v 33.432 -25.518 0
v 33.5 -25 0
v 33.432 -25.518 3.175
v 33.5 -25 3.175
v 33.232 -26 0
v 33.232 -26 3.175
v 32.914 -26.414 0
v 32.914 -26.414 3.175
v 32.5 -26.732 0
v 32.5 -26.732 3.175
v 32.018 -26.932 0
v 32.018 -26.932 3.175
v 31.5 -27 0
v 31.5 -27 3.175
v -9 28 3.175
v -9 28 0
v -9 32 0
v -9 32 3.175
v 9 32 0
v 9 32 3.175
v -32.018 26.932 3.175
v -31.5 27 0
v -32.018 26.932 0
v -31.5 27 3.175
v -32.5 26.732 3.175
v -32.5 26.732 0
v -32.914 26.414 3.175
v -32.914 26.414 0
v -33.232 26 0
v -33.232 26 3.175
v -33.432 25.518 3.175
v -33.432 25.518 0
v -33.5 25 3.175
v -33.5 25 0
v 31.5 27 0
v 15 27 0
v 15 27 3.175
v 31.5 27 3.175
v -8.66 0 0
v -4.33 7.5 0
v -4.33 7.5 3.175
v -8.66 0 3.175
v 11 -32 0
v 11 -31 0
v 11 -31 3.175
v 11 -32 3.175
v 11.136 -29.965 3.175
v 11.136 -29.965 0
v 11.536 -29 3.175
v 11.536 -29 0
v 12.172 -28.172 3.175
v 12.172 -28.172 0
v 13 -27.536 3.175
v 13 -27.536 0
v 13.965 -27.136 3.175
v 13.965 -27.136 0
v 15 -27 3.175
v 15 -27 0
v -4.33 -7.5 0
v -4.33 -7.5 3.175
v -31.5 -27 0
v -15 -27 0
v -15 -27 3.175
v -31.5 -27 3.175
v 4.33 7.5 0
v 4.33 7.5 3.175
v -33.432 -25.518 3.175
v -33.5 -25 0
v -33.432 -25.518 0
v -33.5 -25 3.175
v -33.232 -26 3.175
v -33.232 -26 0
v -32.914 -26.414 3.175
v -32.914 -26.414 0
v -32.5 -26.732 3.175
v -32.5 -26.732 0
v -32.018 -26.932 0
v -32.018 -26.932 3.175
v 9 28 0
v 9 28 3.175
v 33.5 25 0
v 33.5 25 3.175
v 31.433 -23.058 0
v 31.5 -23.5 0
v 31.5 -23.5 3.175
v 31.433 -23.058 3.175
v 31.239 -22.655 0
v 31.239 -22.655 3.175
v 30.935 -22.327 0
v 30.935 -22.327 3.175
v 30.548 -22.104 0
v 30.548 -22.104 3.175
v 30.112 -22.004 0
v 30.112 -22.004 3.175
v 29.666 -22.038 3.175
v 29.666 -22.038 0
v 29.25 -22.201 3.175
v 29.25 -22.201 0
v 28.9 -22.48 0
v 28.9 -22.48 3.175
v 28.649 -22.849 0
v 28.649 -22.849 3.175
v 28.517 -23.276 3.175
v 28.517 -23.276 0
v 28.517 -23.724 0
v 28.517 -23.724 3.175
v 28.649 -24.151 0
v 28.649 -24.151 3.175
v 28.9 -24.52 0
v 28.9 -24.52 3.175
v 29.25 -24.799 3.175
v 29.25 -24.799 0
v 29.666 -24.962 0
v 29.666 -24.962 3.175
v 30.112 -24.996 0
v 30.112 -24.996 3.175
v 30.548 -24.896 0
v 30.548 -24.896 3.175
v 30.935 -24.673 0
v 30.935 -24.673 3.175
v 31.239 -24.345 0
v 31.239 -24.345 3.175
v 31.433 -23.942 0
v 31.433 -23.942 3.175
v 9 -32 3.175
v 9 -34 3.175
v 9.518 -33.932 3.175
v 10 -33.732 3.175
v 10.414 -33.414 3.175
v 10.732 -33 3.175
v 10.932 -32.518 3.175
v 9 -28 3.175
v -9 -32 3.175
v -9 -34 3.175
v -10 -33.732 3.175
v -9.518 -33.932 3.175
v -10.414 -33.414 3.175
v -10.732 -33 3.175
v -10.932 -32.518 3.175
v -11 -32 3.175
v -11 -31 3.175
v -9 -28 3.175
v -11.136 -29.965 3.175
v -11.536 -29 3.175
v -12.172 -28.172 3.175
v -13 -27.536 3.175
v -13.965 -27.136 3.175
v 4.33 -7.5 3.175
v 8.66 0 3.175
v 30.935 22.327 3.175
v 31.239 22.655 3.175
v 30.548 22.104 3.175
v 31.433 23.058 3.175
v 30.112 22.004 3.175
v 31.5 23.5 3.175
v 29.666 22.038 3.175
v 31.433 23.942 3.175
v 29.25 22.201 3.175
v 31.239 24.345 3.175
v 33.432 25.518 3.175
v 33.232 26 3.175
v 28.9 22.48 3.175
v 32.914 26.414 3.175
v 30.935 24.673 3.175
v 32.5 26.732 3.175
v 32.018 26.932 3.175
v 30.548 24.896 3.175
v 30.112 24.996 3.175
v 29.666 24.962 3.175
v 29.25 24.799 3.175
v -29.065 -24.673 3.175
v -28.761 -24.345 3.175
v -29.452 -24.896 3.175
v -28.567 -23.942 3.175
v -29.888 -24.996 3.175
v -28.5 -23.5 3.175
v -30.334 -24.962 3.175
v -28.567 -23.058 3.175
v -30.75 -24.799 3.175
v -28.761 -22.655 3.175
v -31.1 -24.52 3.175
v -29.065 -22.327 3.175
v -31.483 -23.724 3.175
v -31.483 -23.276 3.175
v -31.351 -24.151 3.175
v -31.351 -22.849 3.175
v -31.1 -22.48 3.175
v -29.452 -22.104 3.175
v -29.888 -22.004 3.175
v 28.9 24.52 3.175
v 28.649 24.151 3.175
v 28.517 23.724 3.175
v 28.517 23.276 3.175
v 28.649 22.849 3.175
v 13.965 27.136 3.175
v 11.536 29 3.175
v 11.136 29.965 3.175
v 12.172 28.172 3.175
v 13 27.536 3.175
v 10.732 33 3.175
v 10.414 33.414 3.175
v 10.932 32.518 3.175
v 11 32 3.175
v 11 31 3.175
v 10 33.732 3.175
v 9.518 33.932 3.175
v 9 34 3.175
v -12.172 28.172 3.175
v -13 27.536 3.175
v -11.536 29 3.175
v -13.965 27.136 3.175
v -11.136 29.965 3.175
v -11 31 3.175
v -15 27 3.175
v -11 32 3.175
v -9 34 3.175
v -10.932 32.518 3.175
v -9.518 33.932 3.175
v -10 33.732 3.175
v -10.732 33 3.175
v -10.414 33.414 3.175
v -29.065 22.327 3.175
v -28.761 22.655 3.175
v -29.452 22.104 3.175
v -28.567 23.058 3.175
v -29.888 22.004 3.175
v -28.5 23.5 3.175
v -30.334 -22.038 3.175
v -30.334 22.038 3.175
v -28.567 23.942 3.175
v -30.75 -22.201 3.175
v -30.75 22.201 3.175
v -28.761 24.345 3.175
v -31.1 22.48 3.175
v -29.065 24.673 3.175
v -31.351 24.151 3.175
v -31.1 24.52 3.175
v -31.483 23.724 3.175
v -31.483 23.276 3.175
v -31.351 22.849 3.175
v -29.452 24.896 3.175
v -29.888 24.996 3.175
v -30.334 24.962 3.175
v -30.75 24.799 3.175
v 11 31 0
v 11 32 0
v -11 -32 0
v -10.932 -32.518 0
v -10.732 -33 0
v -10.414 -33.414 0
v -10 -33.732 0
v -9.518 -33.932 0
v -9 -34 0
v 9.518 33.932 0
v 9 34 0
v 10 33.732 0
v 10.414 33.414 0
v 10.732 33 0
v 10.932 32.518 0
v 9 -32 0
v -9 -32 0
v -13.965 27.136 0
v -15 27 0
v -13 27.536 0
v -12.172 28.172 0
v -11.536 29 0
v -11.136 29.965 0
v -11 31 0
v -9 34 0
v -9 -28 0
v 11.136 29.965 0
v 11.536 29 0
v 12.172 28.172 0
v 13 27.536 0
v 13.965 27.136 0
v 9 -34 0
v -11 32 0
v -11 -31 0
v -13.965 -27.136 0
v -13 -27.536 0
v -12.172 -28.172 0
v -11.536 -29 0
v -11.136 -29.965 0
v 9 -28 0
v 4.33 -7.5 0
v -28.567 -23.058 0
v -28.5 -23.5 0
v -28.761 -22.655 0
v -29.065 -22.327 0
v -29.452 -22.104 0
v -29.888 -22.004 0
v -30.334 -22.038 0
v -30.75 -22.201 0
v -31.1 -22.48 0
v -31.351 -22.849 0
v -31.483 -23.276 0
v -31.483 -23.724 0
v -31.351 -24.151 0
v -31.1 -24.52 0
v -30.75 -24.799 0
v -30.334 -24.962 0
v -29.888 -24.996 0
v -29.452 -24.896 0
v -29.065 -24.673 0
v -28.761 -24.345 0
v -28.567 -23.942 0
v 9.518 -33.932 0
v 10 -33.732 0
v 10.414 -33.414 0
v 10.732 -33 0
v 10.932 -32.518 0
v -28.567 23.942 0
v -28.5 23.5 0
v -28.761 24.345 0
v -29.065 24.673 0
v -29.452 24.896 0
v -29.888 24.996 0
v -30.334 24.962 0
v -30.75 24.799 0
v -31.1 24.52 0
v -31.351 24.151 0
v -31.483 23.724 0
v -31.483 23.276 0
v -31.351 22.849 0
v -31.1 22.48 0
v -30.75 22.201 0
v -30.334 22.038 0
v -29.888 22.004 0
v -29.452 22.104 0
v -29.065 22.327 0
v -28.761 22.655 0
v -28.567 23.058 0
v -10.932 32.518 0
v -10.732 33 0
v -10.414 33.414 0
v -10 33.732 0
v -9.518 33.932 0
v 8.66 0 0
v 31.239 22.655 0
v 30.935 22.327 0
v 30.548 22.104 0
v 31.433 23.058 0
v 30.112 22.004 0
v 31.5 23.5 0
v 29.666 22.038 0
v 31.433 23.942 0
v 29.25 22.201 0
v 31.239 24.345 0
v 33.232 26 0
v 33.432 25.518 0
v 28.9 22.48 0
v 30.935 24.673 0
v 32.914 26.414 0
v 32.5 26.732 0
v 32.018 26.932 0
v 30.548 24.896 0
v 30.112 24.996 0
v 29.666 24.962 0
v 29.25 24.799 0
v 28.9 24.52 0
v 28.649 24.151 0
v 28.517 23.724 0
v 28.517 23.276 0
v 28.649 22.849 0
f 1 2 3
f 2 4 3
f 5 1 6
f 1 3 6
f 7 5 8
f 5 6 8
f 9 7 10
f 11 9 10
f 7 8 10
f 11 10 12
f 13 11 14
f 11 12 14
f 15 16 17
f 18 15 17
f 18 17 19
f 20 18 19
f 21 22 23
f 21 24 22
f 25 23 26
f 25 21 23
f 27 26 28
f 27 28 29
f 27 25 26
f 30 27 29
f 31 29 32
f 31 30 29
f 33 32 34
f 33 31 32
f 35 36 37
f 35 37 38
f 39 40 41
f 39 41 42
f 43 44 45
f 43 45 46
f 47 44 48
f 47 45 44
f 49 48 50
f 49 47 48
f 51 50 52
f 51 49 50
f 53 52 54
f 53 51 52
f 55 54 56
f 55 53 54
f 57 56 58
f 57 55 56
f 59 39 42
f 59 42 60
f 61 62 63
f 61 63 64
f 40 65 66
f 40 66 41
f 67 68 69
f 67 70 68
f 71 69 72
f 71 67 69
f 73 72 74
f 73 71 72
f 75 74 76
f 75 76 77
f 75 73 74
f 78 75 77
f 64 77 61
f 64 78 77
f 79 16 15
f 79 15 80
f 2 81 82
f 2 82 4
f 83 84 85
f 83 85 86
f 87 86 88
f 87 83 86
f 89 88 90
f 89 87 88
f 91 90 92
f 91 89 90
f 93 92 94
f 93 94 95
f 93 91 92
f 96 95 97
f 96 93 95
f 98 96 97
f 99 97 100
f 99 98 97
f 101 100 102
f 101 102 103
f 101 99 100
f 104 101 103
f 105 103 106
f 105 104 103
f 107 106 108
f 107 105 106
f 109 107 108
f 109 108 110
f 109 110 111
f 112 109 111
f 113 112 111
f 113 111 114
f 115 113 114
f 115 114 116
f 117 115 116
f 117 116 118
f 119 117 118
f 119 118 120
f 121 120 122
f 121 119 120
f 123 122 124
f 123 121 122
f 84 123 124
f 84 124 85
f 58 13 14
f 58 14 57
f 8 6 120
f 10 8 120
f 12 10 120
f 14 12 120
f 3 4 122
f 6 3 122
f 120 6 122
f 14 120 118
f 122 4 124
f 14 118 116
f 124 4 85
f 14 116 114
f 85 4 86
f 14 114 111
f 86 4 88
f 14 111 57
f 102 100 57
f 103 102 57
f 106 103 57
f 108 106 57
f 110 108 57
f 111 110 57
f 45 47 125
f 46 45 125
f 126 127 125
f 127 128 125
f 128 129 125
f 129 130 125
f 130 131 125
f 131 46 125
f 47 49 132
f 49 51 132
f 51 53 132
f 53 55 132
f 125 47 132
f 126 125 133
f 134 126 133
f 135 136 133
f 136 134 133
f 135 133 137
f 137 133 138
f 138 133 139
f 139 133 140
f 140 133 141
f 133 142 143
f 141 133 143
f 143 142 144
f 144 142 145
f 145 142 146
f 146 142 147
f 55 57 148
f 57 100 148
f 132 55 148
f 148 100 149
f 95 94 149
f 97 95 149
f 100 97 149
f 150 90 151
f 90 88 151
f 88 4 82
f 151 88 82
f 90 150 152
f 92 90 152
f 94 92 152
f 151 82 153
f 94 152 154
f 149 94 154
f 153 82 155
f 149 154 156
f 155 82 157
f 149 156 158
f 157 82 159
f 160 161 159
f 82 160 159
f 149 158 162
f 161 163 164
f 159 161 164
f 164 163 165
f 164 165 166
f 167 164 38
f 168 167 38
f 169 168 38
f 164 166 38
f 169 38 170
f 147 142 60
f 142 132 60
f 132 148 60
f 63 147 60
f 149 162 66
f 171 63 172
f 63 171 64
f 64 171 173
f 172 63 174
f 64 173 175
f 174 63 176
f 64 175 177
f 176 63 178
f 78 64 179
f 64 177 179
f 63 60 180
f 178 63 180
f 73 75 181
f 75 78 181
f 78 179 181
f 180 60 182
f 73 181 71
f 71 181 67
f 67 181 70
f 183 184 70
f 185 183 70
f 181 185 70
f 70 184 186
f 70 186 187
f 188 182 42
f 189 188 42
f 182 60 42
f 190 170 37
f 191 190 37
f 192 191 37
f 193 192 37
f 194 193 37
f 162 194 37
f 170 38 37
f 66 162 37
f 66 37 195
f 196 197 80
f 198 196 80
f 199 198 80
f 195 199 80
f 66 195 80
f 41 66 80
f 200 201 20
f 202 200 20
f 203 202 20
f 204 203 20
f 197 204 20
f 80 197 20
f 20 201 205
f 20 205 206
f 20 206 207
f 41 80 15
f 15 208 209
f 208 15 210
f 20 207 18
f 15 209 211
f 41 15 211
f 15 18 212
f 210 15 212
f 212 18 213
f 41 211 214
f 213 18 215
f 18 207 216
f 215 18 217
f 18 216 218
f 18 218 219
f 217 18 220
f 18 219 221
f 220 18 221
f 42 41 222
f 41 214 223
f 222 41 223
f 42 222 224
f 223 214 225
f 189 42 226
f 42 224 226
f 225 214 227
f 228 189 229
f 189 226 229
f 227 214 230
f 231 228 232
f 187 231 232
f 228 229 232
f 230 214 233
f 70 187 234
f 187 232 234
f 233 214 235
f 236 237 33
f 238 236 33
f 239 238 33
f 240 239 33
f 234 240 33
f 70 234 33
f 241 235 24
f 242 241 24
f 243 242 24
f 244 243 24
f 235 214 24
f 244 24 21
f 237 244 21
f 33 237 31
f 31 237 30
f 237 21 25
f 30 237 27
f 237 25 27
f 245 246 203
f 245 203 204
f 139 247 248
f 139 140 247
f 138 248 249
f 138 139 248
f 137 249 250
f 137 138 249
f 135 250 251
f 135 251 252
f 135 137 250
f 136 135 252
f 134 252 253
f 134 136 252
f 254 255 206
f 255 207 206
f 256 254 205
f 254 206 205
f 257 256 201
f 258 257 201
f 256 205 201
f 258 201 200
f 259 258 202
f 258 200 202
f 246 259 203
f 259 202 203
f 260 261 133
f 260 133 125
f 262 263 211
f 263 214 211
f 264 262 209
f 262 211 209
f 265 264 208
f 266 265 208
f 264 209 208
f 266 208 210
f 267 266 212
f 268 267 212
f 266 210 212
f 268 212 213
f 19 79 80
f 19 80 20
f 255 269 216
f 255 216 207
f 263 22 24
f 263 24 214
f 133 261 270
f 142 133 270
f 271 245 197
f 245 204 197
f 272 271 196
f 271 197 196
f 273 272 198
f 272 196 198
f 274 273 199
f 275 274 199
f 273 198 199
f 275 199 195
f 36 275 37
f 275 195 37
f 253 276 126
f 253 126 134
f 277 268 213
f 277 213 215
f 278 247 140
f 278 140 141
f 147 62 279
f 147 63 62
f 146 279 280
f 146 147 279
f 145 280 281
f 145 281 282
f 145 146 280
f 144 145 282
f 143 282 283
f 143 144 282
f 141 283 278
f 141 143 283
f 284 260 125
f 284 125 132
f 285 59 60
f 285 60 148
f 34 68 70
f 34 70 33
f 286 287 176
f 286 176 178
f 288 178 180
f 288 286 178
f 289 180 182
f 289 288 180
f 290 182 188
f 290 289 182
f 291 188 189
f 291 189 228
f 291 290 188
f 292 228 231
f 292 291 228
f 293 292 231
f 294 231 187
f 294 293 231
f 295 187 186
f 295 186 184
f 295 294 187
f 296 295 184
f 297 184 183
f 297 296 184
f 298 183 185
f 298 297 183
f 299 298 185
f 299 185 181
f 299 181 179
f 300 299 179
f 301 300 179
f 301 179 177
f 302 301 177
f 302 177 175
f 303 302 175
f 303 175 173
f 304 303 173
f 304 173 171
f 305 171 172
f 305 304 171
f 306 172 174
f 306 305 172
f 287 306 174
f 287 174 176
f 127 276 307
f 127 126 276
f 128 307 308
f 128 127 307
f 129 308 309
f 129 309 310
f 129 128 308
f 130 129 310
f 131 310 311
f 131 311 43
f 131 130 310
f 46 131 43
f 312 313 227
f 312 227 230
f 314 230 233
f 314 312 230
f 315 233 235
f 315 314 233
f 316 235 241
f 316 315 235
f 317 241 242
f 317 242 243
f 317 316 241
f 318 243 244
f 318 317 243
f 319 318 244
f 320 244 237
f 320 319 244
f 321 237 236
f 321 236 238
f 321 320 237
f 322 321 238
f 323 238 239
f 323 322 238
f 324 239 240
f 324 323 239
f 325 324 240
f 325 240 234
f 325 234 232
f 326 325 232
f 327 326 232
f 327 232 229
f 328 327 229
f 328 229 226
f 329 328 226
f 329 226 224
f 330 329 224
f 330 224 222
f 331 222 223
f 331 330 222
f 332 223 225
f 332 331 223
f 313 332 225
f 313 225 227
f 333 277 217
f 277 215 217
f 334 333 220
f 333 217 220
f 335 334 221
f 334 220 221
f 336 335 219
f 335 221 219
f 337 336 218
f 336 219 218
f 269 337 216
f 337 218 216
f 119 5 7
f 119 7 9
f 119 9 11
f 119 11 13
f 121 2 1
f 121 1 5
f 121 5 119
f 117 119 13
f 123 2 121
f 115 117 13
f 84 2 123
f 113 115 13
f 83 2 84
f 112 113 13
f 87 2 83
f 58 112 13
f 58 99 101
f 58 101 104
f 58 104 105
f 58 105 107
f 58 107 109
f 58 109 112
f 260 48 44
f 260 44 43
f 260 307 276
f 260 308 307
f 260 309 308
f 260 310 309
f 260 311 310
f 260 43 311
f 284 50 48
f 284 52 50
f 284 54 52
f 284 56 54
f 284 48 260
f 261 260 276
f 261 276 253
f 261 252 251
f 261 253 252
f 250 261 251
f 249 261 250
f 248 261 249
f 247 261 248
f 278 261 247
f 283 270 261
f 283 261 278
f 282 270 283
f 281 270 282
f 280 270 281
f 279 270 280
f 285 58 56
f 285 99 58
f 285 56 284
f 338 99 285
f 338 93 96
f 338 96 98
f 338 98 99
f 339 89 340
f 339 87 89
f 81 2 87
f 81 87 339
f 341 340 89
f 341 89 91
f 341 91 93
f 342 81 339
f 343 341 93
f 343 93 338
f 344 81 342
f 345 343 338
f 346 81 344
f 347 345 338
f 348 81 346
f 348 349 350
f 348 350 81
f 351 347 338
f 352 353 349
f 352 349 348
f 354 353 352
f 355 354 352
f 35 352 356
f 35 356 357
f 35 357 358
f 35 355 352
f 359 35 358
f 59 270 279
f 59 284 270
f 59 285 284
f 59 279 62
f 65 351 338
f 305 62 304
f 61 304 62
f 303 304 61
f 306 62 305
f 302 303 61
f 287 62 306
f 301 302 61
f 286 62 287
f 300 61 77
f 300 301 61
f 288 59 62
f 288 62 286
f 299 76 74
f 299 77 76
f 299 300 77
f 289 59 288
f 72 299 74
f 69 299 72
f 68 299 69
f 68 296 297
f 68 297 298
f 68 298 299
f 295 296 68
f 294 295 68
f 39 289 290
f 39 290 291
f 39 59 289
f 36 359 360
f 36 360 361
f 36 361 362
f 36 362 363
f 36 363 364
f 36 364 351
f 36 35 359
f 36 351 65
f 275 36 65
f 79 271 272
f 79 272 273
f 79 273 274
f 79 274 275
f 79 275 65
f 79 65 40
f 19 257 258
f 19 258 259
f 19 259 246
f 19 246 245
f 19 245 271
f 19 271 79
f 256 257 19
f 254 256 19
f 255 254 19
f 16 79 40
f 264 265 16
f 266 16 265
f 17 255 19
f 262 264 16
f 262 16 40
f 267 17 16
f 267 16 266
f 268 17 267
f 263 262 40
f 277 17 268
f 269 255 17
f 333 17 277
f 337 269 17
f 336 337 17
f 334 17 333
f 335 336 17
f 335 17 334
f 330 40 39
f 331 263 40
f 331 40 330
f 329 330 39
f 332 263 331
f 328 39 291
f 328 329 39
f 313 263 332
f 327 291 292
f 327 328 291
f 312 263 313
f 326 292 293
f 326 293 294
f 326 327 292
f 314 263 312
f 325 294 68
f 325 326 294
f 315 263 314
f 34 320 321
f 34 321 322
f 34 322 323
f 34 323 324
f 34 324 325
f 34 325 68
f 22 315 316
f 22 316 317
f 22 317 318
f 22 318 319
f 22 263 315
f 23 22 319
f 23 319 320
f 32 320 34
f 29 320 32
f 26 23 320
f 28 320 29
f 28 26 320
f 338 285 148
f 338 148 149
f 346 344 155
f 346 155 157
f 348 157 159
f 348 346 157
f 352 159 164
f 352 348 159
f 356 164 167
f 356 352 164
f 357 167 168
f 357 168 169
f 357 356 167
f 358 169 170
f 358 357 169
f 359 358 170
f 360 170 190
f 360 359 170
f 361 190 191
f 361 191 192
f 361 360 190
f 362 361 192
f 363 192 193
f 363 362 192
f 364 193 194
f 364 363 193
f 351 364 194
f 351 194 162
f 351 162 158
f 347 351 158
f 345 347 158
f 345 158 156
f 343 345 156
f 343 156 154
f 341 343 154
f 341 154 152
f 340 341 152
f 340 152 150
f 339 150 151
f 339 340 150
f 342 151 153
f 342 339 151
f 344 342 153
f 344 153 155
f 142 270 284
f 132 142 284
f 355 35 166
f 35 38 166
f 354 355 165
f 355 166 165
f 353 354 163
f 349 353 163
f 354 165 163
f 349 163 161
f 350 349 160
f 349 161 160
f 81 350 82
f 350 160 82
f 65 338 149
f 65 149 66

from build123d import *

# Parameters (mm, degrees)
SKETCH1_R           = 1.5
SKETCH1_W           = 18
SKETCH1_H           = 4
BOSS_EXTRUDE1_DEPTH = 3.175
FILLET1_R           = 4
FILLET2_R           = 2


with BuildPart() as part:
    # Sketch1 → Boss-Extrude1 (new body)
    with BuildSketch(Plane.XY):
        Polygon((-33.5, 27), (-11, 27), (-11, 34), (11, 34), (11, 27), (33.5, 27), (33.5, -27), (11, -27), (11, -34), (-11, -34), (-11, -27), (-33.5, -27), align=None)
        with Locations((-30, 23.5)):
            Circle(SKETCH1_R, mode=Mode.SUBTRACT)
        with Locations((30, 23.5)):
            Circle(SKETCH1_R, mode=Mode.SUBTRACT)
        with Locations((30, -23.5)):
            Circle(SKETCH1_R, mode=Mode.SUBTRACT)
        with Locations((-30, -23.5)):
            Circle(SKETCH1_R, mode=Mode.SUBTRACT)
        with Locations((0, -30)):
            Rectangle(SKETCH1_W, SKETCH1_H, mode=Mode.SUBTRACT)
        with Locations((0, 30)):
            Rectangle(SKETCH1_W, SKETCH1_H, mode=Mode.SUBTRACT)
        Polygon((8.660254038, 0), (4.330127019, 7.5), (-4.330127019, 7.5), (-8.660254038, 0), (-4.330127019, -7.5), (4.330127019, -7.5), align=None, mode=Mode.SUBTRACT)
    extrude(amount=BOSS_EXTRUDE1_DEPTH)

    # Fillet1
    fillet1_edges = [part.edges().sort_by_distance(p)[0] for p in [
        (-11, 27, 1.5875),
        (11, 27, 1.5875),
        (11, -27, 1.5875),
        (-11, -27, 1.5875),
    ]]
    fillet(fillet1_edges, radius=FILLET1_R)

    # Fillet2
    fillet2_edges = [part.edges().sort_by_distance(p)[0] for p in [
        (-33.5, 27, 1.5875),
        (-11, 34, 1.5875),
        (11, 34, 1.5875),
        (33.5, 27, 1.5875),
        (33.5, -27, 1.5875),
        (11, -34, 1.5875),
        (-11, -34, 1.5875),
        (-33.5, -27, 1.5875),
    ]]
    fillet(fillet2_edges, radius=FILLET2_R)


solid = part.part
